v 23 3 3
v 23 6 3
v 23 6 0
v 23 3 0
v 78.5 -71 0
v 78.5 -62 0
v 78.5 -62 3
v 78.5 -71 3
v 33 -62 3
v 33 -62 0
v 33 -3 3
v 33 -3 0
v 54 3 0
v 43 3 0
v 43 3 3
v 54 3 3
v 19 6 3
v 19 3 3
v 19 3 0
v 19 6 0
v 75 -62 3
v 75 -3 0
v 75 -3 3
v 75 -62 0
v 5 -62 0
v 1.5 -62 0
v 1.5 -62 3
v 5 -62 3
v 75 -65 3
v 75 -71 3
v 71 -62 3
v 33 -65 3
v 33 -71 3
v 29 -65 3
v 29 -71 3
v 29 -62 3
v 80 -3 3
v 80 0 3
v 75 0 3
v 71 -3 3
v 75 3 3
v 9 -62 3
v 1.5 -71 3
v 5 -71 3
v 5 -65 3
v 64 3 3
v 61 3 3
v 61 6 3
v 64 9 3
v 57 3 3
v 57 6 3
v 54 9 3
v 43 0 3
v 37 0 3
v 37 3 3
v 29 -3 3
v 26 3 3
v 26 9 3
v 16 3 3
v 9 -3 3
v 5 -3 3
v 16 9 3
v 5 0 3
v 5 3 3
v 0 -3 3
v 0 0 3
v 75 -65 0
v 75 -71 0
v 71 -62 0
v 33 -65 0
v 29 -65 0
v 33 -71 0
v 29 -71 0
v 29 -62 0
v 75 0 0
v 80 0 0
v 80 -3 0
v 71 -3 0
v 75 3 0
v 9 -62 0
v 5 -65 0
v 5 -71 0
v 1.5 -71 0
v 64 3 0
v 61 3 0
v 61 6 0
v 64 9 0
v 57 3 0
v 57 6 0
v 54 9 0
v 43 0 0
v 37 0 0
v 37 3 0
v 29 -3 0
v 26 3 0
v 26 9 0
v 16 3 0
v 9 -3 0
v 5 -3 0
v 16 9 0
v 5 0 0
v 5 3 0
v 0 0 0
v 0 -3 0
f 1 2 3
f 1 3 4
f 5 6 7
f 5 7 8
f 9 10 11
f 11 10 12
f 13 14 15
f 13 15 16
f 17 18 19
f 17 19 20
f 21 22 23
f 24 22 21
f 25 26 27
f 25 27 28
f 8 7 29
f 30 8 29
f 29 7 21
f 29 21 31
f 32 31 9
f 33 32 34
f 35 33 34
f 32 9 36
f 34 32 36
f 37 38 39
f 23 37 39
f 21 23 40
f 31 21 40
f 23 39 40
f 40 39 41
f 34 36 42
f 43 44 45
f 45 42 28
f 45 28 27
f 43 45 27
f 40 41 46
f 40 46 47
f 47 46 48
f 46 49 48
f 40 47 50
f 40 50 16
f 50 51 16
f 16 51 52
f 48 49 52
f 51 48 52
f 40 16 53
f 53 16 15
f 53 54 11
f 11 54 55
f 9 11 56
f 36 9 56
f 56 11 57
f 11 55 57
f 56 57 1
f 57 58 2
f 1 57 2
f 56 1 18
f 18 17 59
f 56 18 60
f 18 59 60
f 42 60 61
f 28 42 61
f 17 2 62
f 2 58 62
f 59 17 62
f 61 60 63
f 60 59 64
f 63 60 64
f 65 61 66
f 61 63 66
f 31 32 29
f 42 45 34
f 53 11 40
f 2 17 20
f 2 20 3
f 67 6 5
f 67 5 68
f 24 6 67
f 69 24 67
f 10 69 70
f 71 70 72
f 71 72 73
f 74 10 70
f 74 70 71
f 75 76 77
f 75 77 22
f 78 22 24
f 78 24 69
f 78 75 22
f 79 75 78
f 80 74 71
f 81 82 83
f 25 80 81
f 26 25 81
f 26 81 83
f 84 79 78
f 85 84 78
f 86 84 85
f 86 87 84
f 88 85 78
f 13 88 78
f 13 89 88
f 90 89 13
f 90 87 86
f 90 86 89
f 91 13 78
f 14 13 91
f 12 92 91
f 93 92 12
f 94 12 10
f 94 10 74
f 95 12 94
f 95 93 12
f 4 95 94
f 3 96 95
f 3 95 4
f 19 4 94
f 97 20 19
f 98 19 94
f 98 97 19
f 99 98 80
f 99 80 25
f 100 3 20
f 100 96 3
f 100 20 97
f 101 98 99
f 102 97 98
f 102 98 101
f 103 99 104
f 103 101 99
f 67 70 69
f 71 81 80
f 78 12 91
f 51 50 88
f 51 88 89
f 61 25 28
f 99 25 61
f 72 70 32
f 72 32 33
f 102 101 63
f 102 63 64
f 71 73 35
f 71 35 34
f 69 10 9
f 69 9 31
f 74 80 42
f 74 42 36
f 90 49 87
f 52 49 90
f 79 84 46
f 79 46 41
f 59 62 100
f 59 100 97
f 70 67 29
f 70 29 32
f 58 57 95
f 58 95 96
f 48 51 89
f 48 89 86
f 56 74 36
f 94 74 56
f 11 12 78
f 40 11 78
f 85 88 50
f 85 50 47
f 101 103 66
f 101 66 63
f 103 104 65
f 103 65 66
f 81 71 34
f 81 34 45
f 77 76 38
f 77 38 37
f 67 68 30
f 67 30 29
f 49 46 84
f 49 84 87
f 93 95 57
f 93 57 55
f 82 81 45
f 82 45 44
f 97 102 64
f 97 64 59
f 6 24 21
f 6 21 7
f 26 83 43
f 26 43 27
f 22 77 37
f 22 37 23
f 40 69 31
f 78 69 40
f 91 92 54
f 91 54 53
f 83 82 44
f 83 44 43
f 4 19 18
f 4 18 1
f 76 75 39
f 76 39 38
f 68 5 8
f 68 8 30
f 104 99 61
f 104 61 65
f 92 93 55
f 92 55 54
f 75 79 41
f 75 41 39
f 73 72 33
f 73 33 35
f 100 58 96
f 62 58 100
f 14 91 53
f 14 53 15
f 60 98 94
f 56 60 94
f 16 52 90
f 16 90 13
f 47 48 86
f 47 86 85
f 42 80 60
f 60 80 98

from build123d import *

# Parameters (mm, degrees)
SKETCH1_W           = 20
SKETCH1_H           = 59
SKETCH1_W_2         = 38
BOSS_EXTRUDE1_DEPTH = 3
BOSS_EXTRUDE2_DEPTH = 3


with BuildPart() as part:
    # Sketch1 → Boss-Extrude1 (new body)
    with BuildSketch(Plane.XY):
        Polygon((5, -3), (0, -3), (0, 0), (5, 0), (5, 3), (37, 3), (37, 0), (43, 0), (43, 3), (75, 3), (75, 0), (80, 0), (80, -3), (75, -3), (75, -62), (78.5, -62), (78.5, -71), (75, -71), (75, -65), (33, -65), (33, -71), (29, -71), (29, -65), (5, -65), (5, -71), (1.5, -71), (1.5, -62), (5, -62), align=None)
        with Locations((19, -32.5)):
            Rectangle(SKETCH1_W, SKETCH1_H, mode=Mode.SUBTRACT)
        with Locations((52, -32.5)):
            Rectangle(SKETCH1_W_2, SKETCH1_H, mode=Mode.SUBTRACT)
    extrude(amount=BOSS_EXTRUDE1_DEPTH)

    # Sketch2 → Boss-Extrude2 (add)
    with BuildSketch(Plane.XY.offset(3)):
        Polygon((16, 9), (16, 3), (19, 3), (19, 6), (23, 6), (23, 3), (26, 3), (26, 9), align=None)
        Polygon((54, 3), (57, 3), (57, 6), (61, 6), (61, 3), (64, 3), (64, 9), (54, 9), align=None)
    extrude(amount=-BOSS_EXTRUDE2_DEPTH)


solid = part.part
